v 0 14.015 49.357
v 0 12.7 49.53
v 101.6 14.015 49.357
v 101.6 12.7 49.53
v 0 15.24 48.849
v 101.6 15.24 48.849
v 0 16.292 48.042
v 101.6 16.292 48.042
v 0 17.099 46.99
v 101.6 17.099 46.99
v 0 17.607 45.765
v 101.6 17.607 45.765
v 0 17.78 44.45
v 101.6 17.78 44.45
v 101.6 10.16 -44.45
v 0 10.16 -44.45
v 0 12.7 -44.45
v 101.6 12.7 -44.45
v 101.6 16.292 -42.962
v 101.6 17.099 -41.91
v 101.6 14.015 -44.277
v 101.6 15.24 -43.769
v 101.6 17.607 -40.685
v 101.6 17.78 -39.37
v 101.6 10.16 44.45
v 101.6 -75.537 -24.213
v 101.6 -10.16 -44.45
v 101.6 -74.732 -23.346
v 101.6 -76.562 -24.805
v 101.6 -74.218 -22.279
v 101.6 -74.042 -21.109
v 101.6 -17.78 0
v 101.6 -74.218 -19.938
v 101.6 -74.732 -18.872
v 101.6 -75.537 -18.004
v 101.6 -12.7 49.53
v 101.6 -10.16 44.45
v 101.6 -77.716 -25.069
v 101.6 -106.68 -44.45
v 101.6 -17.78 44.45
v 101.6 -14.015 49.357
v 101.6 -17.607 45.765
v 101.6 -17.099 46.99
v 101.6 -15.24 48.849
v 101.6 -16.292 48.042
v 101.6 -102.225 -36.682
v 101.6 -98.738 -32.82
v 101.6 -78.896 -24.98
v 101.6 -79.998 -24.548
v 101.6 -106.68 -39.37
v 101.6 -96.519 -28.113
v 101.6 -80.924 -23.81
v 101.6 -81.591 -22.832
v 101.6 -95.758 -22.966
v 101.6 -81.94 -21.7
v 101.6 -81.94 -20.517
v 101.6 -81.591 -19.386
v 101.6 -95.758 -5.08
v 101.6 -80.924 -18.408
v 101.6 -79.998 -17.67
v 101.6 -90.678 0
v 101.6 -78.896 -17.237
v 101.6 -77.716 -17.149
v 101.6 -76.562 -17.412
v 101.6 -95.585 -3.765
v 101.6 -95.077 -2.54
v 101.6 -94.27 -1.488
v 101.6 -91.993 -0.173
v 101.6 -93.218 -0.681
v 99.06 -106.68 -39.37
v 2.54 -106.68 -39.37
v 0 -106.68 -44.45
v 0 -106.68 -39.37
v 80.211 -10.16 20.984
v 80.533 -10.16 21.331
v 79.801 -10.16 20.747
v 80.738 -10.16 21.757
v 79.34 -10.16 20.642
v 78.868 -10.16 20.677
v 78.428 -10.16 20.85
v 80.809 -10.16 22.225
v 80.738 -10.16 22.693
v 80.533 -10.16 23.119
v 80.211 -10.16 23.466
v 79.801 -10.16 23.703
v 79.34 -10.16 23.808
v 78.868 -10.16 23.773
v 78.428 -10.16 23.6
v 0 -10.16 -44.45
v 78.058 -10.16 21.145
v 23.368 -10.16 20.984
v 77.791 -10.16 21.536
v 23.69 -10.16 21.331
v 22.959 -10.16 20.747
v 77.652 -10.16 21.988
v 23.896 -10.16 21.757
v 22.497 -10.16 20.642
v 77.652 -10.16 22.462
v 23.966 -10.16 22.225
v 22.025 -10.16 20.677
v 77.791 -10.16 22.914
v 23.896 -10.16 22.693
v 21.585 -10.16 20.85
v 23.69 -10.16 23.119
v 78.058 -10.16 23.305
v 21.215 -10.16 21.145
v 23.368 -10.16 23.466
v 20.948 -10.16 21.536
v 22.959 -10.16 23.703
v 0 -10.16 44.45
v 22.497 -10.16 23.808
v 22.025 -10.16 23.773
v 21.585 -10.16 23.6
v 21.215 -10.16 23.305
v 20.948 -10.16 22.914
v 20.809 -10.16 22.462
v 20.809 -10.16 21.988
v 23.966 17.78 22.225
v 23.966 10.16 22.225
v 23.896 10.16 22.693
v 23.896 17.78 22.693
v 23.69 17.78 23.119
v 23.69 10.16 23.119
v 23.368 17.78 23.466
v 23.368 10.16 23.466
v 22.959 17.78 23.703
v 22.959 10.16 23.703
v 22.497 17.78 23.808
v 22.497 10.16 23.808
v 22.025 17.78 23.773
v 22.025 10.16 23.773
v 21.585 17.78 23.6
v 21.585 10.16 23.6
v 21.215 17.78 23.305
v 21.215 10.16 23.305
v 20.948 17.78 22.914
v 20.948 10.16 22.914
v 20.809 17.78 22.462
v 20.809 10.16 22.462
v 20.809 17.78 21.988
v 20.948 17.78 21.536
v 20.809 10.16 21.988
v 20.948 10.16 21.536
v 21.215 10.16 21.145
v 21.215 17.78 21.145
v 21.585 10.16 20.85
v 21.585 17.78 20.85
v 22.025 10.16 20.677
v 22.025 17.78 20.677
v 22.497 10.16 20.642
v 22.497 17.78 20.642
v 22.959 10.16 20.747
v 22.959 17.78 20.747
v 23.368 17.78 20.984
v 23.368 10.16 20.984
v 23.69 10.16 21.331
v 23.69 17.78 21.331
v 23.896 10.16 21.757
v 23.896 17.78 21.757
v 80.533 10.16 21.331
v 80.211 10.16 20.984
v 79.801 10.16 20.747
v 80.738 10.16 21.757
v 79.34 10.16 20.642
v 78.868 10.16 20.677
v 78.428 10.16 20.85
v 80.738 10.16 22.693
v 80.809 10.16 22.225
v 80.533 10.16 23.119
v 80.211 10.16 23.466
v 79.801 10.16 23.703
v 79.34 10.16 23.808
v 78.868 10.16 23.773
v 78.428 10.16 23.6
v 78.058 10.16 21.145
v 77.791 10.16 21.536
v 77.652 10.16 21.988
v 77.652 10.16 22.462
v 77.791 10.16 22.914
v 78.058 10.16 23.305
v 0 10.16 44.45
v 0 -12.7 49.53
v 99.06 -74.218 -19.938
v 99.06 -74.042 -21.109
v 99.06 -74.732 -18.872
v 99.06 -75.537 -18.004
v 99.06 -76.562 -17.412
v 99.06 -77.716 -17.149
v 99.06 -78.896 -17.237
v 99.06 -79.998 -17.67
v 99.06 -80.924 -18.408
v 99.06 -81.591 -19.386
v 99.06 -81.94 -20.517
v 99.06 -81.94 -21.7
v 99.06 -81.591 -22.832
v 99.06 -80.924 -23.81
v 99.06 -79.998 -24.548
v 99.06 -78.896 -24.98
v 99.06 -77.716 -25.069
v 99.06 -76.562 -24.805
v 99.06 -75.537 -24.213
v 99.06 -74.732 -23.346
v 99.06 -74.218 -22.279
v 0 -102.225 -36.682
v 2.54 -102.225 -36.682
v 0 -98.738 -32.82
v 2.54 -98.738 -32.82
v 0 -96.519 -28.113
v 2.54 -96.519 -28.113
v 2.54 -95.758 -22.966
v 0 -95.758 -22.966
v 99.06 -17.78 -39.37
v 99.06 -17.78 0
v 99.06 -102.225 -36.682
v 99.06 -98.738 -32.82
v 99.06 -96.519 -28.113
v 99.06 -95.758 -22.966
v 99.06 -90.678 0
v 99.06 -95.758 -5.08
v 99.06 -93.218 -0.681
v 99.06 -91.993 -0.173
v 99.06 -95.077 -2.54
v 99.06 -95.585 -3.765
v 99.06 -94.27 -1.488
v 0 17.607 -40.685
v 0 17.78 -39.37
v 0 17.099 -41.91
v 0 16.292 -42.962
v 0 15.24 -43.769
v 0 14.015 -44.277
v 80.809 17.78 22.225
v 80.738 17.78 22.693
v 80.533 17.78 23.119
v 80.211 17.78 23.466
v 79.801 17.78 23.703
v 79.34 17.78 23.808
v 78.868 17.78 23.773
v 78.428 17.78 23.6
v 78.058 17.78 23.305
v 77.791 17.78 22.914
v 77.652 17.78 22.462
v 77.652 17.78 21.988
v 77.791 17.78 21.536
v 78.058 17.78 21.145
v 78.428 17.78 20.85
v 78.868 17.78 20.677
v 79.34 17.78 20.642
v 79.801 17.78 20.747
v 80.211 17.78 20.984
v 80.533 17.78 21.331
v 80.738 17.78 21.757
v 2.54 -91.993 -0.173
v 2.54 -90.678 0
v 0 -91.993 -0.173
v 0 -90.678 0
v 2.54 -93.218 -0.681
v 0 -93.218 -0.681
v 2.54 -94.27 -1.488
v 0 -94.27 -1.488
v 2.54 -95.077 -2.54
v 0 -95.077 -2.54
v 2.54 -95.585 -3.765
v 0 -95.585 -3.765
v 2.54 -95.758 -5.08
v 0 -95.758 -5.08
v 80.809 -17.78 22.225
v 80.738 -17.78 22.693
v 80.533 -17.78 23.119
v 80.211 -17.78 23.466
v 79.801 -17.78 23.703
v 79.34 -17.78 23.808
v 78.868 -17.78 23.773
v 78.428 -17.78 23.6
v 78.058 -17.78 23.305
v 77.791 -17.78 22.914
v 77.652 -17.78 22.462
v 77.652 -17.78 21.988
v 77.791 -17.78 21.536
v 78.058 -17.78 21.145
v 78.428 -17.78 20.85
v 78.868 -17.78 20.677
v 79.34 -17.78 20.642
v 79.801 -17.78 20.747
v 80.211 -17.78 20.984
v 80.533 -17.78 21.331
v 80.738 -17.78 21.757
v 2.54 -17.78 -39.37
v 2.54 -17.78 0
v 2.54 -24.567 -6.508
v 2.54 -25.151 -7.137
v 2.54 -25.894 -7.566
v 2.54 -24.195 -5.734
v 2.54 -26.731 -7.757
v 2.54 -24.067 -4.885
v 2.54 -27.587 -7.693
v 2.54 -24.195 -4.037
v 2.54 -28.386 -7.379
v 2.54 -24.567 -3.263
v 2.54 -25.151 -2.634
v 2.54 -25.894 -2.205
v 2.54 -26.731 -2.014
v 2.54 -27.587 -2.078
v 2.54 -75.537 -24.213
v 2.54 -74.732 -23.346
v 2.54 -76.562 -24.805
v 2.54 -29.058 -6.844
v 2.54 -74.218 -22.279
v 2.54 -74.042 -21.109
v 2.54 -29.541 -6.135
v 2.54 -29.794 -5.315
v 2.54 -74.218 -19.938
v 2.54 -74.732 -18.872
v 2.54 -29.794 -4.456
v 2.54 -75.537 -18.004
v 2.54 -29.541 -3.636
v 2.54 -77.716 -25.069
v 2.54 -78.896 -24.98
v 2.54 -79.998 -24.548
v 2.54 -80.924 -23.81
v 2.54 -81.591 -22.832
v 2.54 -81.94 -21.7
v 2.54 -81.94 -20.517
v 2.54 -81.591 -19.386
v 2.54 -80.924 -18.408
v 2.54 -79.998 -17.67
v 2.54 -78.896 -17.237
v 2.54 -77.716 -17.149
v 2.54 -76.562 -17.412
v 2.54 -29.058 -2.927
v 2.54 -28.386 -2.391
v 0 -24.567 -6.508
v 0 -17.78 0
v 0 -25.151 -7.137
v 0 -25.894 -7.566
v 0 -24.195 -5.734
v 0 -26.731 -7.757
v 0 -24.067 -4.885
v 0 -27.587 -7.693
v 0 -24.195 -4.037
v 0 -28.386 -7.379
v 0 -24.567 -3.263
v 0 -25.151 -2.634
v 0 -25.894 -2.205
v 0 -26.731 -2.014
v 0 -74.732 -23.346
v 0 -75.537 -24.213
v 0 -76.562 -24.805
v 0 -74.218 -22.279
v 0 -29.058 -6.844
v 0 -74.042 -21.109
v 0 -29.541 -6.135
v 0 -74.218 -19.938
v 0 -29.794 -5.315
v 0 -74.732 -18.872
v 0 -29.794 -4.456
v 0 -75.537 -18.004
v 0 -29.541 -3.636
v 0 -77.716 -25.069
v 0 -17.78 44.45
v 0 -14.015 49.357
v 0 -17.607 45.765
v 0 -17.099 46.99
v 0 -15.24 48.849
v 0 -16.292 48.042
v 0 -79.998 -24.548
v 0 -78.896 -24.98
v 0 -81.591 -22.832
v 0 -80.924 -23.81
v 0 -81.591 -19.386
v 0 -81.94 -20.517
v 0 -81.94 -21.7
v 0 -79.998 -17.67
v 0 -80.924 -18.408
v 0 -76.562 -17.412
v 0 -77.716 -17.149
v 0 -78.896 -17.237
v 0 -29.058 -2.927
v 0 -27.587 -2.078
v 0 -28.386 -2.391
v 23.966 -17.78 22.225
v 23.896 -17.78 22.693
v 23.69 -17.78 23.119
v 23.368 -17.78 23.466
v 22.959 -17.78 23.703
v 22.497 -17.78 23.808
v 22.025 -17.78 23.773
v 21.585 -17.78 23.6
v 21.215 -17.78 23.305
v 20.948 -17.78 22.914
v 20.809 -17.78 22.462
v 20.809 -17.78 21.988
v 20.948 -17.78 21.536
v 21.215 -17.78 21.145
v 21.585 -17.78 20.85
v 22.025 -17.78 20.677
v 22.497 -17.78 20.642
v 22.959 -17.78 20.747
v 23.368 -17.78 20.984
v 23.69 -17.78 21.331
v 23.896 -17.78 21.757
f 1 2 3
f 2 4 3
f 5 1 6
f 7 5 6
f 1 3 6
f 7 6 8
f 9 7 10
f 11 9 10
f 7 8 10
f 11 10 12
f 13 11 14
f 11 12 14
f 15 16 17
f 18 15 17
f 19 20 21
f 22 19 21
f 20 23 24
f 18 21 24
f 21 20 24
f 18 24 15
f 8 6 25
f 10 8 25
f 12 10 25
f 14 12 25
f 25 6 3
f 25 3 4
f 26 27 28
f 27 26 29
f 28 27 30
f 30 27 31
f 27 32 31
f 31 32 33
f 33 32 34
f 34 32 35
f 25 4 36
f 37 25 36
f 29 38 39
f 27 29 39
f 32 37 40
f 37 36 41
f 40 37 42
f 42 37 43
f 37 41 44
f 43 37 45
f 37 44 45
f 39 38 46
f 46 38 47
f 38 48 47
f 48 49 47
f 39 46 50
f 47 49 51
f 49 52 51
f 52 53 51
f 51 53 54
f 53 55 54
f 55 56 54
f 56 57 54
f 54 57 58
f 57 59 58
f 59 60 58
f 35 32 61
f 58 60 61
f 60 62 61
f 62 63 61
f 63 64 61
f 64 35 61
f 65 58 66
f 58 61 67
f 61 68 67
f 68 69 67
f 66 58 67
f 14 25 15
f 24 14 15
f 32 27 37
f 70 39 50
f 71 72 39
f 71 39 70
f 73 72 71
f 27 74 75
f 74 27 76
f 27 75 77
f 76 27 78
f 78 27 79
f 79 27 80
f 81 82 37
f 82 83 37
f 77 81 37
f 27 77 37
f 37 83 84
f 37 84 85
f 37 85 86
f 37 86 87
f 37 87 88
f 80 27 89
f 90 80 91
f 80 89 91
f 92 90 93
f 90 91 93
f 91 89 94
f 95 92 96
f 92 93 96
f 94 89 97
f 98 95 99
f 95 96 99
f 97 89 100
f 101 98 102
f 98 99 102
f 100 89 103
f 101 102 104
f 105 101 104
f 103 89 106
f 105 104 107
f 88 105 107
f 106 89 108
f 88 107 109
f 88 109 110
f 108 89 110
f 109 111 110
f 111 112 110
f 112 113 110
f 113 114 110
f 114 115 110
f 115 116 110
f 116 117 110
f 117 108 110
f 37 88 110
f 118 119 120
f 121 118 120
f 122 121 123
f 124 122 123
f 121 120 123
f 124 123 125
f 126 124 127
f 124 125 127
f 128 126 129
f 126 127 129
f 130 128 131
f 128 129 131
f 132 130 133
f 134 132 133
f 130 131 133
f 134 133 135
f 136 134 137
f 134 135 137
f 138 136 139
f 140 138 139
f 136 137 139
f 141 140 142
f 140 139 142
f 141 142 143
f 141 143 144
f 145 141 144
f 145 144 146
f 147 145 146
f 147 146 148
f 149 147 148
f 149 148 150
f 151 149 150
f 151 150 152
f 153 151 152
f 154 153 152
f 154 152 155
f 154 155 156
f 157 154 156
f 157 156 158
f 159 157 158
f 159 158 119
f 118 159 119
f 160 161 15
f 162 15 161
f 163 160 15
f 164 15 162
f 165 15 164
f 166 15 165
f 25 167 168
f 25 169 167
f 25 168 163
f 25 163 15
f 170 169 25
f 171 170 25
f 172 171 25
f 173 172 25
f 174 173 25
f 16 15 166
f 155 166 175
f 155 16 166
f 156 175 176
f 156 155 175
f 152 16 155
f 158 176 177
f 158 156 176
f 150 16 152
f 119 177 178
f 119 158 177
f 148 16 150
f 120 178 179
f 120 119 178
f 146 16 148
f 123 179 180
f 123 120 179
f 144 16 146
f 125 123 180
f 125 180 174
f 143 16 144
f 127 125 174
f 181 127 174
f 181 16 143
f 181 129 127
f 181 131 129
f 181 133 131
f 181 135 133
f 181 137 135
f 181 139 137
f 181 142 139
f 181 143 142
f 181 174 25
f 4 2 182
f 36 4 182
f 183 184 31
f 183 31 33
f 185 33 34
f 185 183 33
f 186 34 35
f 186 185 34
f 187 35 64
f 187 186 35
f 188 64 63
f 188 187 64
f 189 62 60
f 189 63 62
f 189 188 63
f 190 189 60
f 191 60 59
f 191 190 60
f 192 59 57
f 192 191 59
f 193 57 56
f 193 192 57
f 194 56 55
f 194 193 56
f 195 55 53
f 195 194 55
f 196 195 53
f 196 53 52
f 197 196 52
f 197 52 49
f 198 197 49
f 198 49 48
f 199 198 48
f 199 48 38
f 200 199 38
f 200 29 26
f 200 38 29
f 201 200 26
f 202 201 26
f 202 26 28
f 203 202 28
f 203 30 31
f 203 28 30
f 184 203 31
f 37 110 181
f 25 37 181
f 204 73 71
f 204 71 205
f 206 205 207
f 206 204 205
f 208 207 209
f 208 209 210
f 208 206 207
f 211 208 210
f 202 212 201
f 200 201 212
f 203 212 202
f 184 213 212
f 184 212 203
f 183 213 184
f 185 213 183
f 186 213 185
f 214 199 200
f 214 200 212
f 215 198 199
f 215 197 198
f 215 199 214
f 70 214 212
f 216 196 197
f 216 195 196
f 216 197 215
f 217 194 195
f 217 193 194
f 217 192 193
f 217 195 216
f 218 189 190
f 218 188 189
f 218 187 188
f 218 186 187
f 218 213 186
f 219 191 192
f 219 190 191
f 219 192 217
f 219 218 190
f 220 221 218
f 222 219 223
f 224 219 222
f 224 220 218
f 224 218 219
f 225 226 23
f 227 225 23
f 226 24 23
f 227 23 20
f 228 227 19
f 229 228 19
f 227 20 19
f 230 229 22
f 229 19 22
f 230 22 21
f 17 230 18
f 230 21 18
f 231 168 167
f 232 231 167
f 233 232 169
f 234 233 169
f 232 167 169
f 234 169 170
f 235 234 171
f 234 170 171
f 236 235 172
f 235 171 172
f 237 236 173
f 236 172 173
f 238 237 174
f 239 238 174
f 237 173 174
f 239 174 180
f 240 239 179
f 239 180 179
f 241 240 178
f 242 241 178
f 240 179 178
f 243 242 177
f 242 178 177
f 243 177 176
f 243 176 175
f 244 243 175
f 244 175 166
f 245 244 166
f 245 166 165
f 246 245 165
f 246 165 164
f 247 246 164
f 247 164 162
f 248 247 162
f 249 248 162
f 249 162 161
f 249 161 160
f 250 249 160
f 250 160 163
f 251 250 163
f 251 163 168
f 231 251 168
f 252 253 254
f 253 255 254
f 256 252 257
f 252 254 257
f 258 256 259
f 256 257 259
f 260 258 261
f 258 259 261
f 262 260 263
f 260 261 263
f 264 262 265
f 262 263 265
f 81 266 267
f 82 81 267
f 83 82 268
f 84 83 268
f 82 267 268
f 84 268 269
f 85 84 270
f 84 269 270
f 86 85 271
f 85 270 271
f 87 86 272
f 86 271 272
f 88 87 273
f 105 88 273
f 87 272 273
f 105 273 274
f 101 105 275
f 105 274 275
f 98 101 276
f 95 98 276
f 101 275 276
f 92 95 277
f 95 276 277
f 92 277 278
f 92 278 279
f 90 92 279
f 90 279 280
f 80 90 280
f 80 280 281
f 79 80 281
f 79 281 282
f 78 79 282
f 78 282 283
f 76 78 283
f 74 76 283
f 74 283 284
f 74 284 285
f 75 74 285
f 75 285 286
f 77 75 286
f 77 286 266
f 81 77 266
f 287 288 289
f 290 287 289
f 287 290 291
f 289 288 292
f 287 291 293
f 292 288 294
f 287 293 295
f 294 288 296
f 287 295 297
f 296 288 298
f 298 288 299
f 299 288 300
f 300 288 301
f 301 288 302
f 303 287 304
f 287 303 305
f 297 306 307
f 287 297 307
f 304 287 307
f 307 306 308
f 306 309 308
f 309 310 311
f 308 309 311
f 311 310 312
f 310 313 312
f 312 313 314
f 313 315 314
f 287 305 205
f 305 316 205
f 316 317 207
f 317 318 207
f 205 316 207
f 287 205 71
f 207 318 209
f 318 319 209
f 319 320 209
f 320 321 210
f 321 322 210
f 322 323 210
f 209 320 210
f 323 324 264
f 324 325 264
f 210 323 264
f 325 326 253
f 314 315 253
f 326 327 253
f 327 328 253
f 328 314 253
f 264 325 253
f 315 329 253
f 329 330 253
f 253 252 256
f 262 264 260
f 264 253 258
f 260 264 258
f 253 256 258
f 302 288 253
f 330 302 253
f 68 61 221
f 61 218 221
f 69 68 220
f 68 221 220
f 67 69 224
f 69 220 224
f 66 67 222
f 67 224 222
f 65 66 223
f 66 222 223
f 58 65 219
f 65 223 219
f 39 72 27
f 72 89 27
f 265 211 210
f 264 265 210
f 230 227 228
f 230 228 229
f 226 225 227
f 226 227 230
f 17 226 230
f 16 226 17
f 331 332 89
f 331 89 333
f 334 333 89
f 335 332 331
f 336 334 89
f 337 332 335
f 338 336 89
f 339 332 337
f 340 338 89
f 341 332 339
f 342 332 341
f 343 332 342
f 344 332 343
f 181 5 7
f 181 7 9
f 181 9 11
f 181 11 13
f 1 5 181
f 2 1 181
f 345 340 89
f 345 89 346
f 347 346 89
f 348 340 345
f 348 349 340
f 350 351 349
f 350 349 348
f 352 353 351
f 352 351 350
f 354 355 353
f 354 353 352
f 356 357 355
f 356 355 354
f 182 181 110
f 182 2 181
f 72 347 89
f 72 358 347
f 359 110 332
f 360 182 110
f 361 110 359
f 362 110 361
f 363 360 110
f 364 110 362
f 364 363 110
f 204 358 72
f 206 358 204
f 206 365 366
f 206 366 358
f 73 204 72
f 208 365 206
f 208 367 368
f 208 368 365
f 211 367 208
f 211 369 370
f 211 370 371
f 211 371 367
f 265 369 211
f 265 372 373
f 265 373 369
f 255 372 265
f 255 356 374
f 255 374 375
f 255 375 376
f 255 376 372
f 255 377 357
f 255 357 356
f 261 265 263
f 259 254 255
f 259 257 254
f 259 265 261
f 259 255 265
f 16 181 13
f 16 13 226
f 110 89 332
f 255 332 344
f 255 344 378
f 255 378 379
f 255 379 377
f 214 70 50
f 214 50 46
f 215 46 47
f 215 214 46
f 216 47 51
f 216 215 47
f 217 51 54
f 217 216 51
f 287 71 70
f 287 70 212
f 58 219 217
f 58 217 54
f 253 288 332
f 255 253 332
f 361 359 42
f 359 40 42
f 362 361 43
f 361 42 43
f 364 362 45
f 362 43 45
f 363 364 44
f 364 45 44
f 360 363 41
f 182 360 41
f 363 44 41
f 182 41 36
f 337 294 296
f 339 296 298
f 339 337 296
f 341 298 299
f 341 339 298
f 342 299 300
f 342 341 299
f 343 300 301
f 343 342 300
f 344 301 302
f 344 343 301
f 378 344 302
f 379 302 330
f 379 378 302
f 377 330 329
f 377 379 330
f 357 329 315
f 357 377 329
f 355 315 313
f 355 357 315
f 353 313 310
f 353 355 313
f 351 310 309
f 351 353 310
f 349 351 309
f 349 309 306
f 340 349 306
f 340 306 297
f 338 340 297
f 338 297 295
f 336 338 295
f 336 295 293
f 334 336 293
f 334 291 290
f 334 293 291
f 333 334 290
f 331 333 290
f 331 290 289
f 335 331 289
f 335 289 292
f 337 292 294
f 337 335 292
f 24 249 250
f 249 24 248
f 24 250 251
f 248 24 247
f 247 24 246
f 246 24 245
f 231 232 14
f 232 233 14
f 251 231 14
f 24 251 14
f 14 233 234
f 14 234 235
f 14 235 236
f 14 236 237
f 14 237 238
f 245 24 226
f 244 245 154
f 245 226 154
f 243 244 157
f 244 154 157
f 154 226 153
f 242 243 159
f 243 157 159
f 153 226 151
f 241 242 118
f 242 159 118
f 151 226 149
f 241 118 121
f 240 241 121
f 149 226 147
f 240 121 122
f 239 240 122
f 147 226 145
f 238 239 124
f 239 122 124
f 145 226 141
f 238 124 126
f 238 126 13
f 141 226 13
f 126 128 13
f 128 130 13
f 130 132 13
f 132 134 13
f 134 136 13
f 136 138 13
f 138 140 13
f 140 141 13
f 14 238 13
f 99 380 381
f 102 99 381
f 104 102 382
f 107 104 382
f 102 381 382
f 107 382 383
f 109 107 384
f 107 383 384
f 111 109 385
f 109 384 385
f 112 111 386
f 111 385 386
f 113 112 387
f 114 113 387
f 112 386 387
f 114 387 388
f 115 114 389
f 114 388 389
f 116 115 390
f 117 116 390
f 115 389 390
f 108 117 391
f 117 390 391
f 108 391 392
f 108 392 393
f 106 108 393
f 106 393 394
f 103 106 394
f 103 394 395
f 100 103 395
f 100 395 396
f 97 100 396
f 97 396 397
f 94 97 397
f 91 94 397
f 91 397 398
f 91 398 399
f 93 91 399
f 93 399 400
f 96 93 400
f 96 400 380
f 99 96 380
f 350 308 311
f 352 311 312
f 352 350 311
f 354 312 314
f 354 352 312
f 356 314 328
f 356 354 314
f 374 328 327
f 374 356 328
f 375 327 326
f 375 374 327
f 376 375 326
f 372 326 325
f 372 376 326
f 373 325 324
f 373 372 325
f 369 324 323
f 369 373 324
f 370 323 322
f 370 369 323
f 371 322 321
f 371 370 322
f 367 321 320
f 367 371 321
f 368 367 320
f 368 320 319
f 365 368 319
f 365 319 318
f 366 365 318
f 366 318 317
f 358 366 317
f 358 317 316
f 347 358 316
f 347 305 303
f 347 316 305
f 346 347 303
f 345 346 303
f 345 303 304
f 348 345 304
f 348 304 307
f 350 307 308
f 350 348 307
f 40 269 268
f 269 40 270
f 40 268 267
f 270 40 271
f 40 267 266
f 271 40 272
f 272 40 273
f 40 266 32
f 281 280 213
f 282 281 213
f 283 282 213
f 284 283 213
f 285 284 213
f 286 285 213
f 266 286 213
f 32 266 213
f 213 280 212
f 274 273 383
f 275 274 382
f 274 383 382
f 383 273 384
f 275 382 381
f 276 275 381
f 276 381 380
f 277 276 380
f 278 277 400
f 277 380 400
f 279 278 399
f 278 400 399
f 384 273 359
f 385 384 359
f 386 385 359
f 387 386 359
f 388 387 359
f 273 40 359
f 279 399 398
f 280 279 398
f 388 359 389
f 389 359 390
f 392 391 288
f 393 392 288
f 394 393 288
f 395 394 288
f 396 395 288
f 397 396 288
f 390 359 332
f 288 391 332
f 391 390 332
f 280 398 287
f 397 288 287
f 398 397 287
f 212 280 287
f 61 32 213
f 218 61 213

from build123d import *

# Parameters (mm, degrees)
F0_W        = 7.62
F0_H        = 88.9
F0_H_2      = 83.82
F0_W_2      = 88.9
F0_H_3      = 5.08
F1_DEPTH    = 101.6
F3_START    = 17.018
F3_DEPTH    = 78.74
F4_T1_DEPTH = 2.54
F4_T3_DEPTH = 2.54
F5_R        = 5.08
F6_R        = 5.08
F7_R        = 5.08
F8_R        = 3.9711233586
F9_DEPTH    = 154.686
F10_R       = 2.8797148657
F11_DEPTH   = 33.782
F12_R       = 1.5875
F13_DEPTH   = 85.344


# Not quite as in the source:
# - a fillet or chamfer that OpenCascade refuses, or shapes differently, is made with other operations: its cross-section is extruded or revolved along the edge and cut away or added


with BuildPart() as f1:
    # F0 (on Right) → F1 (new body)
    with BuildSketch(Plane.YZ):
        with Locations((13.97, 0)):
            Rectangle(F0_W, F0_H)
        Polygon((-10.16, 44.45), (10.16, 44.45), (17.78, 44.45), (17.78, 49.53), (-17.78, 49.53), (-17.78, 44.45), align=None)
        with Locations((-13.97, 2.54)):
            Rectangle(F0_W, F0_H_2)
        with Locations((-62.23, -41.91)):
            Rectangle(F0_W_2, F0_H_3)
        with Locations((-13.97, -41.91)):
            Rectangle(F0_W, F0_H_3)
    extrude(amount=F1_DEPTH)

    # F2 (on Front) → F3 (join)
    with BuildSketch(Plane.XZ.offset(F3_START)):
        Polygon((0, 0), (0, -39.37), (0, -44.45), (2.54, -44.45), (2.54, 0), align=None)
        Polygon((101.6, 0), (99.06, 0), (99.06, -44.45), (101.6, -44.45), (101.6, -39.37), align=None)
    extrude(amount=F3_DEPTH)

    # F4: fillet of radius 17.78 on 2 edges, made by hand

    # F4_s2 → F4_t1 (join)
    with BuildSketch(Plane.YZ.offset(99.06)):
        with BuildLine():
            ThreePointArc((-106.68, -39.37), (-98.7382763539, -32.8196066778), (-95.758, -22.9658469893))
            Line((-95.758, -22.9658469893), (-95.758, -39.37))
            Line((-95.758, -39.37), (-106.68, -39.37))
        make_face()
    extrude(amount=F4_T1_DEPTH)

    # F4_s4 → F4_t3 (join)
    with BuildSketch(Plane.YZ):
        with BuildLine():
            ThreePointArc((-106.68, -39.37), (-98.7382763539, -32.8196066778), (-95.758, -22.9658469893))
            Line((-95.758, -22.9658469893), (-95.758, -39.37))
            Line((-95.758, -39.37), (-106.68, -39.37))
        make_face()
    extrude(amount=F4_T3_DEPTH)

    # F5
    f5_edges = [f1.edges().sort_by_distance(p)[0] for p in [
        (1.27, -95.758, 0),
        (100.33, -95.758, 0),
    ]]
    fillet(f5_edges, radius=F5_R)

    # F6
    f6_edges = [f1.edges().sort_by_distance(p)[0] for p in [
        (50.8, -17.78, 49.53),
        (50.8, 17.78, 49.53),
    ]]
    fillet(f6_edges, radius=F6_R)

    # F7
    f7_edges = [f1.edges().sort_by_distance(p)[0] for p in [
        (50.8, 17.78, -44.45),
    ]]
    fillet(f7_edges, radius=F7_R)

    # F8 (on Right) → F9 (cut)
    with BuildSketch(Plane.YZ):
        with Locations((-78.0128240585, -21.108629182)):
            Circle(F8_R)
    extrude(amount=F9_DEPTH, mode=Mode.SUBTRACT)

    # F10 (on Right) → F11 (cut)
    with BuildSketch(Plane.YZ):
        with Locations((-26.9465316087, -4.8854034394)):
            Circle(F10_R)
    extrude(amount=F11_DEPTH, mode=Mode.SUBTRACT)

    # F12 (on face) → F13 (cut)
    with BuildSketch(Plane.XZ.offset(17.78)):
        with Locations((22.3786290735, 22.225)):
            Circle(F12_R)
        with Locations((79.2213709265, 22.225)):
            Circle(F12_R)
    extrude(amount=-F13_DEPTH, mode=Mode.SUBTRACT)


solid = f1.part
